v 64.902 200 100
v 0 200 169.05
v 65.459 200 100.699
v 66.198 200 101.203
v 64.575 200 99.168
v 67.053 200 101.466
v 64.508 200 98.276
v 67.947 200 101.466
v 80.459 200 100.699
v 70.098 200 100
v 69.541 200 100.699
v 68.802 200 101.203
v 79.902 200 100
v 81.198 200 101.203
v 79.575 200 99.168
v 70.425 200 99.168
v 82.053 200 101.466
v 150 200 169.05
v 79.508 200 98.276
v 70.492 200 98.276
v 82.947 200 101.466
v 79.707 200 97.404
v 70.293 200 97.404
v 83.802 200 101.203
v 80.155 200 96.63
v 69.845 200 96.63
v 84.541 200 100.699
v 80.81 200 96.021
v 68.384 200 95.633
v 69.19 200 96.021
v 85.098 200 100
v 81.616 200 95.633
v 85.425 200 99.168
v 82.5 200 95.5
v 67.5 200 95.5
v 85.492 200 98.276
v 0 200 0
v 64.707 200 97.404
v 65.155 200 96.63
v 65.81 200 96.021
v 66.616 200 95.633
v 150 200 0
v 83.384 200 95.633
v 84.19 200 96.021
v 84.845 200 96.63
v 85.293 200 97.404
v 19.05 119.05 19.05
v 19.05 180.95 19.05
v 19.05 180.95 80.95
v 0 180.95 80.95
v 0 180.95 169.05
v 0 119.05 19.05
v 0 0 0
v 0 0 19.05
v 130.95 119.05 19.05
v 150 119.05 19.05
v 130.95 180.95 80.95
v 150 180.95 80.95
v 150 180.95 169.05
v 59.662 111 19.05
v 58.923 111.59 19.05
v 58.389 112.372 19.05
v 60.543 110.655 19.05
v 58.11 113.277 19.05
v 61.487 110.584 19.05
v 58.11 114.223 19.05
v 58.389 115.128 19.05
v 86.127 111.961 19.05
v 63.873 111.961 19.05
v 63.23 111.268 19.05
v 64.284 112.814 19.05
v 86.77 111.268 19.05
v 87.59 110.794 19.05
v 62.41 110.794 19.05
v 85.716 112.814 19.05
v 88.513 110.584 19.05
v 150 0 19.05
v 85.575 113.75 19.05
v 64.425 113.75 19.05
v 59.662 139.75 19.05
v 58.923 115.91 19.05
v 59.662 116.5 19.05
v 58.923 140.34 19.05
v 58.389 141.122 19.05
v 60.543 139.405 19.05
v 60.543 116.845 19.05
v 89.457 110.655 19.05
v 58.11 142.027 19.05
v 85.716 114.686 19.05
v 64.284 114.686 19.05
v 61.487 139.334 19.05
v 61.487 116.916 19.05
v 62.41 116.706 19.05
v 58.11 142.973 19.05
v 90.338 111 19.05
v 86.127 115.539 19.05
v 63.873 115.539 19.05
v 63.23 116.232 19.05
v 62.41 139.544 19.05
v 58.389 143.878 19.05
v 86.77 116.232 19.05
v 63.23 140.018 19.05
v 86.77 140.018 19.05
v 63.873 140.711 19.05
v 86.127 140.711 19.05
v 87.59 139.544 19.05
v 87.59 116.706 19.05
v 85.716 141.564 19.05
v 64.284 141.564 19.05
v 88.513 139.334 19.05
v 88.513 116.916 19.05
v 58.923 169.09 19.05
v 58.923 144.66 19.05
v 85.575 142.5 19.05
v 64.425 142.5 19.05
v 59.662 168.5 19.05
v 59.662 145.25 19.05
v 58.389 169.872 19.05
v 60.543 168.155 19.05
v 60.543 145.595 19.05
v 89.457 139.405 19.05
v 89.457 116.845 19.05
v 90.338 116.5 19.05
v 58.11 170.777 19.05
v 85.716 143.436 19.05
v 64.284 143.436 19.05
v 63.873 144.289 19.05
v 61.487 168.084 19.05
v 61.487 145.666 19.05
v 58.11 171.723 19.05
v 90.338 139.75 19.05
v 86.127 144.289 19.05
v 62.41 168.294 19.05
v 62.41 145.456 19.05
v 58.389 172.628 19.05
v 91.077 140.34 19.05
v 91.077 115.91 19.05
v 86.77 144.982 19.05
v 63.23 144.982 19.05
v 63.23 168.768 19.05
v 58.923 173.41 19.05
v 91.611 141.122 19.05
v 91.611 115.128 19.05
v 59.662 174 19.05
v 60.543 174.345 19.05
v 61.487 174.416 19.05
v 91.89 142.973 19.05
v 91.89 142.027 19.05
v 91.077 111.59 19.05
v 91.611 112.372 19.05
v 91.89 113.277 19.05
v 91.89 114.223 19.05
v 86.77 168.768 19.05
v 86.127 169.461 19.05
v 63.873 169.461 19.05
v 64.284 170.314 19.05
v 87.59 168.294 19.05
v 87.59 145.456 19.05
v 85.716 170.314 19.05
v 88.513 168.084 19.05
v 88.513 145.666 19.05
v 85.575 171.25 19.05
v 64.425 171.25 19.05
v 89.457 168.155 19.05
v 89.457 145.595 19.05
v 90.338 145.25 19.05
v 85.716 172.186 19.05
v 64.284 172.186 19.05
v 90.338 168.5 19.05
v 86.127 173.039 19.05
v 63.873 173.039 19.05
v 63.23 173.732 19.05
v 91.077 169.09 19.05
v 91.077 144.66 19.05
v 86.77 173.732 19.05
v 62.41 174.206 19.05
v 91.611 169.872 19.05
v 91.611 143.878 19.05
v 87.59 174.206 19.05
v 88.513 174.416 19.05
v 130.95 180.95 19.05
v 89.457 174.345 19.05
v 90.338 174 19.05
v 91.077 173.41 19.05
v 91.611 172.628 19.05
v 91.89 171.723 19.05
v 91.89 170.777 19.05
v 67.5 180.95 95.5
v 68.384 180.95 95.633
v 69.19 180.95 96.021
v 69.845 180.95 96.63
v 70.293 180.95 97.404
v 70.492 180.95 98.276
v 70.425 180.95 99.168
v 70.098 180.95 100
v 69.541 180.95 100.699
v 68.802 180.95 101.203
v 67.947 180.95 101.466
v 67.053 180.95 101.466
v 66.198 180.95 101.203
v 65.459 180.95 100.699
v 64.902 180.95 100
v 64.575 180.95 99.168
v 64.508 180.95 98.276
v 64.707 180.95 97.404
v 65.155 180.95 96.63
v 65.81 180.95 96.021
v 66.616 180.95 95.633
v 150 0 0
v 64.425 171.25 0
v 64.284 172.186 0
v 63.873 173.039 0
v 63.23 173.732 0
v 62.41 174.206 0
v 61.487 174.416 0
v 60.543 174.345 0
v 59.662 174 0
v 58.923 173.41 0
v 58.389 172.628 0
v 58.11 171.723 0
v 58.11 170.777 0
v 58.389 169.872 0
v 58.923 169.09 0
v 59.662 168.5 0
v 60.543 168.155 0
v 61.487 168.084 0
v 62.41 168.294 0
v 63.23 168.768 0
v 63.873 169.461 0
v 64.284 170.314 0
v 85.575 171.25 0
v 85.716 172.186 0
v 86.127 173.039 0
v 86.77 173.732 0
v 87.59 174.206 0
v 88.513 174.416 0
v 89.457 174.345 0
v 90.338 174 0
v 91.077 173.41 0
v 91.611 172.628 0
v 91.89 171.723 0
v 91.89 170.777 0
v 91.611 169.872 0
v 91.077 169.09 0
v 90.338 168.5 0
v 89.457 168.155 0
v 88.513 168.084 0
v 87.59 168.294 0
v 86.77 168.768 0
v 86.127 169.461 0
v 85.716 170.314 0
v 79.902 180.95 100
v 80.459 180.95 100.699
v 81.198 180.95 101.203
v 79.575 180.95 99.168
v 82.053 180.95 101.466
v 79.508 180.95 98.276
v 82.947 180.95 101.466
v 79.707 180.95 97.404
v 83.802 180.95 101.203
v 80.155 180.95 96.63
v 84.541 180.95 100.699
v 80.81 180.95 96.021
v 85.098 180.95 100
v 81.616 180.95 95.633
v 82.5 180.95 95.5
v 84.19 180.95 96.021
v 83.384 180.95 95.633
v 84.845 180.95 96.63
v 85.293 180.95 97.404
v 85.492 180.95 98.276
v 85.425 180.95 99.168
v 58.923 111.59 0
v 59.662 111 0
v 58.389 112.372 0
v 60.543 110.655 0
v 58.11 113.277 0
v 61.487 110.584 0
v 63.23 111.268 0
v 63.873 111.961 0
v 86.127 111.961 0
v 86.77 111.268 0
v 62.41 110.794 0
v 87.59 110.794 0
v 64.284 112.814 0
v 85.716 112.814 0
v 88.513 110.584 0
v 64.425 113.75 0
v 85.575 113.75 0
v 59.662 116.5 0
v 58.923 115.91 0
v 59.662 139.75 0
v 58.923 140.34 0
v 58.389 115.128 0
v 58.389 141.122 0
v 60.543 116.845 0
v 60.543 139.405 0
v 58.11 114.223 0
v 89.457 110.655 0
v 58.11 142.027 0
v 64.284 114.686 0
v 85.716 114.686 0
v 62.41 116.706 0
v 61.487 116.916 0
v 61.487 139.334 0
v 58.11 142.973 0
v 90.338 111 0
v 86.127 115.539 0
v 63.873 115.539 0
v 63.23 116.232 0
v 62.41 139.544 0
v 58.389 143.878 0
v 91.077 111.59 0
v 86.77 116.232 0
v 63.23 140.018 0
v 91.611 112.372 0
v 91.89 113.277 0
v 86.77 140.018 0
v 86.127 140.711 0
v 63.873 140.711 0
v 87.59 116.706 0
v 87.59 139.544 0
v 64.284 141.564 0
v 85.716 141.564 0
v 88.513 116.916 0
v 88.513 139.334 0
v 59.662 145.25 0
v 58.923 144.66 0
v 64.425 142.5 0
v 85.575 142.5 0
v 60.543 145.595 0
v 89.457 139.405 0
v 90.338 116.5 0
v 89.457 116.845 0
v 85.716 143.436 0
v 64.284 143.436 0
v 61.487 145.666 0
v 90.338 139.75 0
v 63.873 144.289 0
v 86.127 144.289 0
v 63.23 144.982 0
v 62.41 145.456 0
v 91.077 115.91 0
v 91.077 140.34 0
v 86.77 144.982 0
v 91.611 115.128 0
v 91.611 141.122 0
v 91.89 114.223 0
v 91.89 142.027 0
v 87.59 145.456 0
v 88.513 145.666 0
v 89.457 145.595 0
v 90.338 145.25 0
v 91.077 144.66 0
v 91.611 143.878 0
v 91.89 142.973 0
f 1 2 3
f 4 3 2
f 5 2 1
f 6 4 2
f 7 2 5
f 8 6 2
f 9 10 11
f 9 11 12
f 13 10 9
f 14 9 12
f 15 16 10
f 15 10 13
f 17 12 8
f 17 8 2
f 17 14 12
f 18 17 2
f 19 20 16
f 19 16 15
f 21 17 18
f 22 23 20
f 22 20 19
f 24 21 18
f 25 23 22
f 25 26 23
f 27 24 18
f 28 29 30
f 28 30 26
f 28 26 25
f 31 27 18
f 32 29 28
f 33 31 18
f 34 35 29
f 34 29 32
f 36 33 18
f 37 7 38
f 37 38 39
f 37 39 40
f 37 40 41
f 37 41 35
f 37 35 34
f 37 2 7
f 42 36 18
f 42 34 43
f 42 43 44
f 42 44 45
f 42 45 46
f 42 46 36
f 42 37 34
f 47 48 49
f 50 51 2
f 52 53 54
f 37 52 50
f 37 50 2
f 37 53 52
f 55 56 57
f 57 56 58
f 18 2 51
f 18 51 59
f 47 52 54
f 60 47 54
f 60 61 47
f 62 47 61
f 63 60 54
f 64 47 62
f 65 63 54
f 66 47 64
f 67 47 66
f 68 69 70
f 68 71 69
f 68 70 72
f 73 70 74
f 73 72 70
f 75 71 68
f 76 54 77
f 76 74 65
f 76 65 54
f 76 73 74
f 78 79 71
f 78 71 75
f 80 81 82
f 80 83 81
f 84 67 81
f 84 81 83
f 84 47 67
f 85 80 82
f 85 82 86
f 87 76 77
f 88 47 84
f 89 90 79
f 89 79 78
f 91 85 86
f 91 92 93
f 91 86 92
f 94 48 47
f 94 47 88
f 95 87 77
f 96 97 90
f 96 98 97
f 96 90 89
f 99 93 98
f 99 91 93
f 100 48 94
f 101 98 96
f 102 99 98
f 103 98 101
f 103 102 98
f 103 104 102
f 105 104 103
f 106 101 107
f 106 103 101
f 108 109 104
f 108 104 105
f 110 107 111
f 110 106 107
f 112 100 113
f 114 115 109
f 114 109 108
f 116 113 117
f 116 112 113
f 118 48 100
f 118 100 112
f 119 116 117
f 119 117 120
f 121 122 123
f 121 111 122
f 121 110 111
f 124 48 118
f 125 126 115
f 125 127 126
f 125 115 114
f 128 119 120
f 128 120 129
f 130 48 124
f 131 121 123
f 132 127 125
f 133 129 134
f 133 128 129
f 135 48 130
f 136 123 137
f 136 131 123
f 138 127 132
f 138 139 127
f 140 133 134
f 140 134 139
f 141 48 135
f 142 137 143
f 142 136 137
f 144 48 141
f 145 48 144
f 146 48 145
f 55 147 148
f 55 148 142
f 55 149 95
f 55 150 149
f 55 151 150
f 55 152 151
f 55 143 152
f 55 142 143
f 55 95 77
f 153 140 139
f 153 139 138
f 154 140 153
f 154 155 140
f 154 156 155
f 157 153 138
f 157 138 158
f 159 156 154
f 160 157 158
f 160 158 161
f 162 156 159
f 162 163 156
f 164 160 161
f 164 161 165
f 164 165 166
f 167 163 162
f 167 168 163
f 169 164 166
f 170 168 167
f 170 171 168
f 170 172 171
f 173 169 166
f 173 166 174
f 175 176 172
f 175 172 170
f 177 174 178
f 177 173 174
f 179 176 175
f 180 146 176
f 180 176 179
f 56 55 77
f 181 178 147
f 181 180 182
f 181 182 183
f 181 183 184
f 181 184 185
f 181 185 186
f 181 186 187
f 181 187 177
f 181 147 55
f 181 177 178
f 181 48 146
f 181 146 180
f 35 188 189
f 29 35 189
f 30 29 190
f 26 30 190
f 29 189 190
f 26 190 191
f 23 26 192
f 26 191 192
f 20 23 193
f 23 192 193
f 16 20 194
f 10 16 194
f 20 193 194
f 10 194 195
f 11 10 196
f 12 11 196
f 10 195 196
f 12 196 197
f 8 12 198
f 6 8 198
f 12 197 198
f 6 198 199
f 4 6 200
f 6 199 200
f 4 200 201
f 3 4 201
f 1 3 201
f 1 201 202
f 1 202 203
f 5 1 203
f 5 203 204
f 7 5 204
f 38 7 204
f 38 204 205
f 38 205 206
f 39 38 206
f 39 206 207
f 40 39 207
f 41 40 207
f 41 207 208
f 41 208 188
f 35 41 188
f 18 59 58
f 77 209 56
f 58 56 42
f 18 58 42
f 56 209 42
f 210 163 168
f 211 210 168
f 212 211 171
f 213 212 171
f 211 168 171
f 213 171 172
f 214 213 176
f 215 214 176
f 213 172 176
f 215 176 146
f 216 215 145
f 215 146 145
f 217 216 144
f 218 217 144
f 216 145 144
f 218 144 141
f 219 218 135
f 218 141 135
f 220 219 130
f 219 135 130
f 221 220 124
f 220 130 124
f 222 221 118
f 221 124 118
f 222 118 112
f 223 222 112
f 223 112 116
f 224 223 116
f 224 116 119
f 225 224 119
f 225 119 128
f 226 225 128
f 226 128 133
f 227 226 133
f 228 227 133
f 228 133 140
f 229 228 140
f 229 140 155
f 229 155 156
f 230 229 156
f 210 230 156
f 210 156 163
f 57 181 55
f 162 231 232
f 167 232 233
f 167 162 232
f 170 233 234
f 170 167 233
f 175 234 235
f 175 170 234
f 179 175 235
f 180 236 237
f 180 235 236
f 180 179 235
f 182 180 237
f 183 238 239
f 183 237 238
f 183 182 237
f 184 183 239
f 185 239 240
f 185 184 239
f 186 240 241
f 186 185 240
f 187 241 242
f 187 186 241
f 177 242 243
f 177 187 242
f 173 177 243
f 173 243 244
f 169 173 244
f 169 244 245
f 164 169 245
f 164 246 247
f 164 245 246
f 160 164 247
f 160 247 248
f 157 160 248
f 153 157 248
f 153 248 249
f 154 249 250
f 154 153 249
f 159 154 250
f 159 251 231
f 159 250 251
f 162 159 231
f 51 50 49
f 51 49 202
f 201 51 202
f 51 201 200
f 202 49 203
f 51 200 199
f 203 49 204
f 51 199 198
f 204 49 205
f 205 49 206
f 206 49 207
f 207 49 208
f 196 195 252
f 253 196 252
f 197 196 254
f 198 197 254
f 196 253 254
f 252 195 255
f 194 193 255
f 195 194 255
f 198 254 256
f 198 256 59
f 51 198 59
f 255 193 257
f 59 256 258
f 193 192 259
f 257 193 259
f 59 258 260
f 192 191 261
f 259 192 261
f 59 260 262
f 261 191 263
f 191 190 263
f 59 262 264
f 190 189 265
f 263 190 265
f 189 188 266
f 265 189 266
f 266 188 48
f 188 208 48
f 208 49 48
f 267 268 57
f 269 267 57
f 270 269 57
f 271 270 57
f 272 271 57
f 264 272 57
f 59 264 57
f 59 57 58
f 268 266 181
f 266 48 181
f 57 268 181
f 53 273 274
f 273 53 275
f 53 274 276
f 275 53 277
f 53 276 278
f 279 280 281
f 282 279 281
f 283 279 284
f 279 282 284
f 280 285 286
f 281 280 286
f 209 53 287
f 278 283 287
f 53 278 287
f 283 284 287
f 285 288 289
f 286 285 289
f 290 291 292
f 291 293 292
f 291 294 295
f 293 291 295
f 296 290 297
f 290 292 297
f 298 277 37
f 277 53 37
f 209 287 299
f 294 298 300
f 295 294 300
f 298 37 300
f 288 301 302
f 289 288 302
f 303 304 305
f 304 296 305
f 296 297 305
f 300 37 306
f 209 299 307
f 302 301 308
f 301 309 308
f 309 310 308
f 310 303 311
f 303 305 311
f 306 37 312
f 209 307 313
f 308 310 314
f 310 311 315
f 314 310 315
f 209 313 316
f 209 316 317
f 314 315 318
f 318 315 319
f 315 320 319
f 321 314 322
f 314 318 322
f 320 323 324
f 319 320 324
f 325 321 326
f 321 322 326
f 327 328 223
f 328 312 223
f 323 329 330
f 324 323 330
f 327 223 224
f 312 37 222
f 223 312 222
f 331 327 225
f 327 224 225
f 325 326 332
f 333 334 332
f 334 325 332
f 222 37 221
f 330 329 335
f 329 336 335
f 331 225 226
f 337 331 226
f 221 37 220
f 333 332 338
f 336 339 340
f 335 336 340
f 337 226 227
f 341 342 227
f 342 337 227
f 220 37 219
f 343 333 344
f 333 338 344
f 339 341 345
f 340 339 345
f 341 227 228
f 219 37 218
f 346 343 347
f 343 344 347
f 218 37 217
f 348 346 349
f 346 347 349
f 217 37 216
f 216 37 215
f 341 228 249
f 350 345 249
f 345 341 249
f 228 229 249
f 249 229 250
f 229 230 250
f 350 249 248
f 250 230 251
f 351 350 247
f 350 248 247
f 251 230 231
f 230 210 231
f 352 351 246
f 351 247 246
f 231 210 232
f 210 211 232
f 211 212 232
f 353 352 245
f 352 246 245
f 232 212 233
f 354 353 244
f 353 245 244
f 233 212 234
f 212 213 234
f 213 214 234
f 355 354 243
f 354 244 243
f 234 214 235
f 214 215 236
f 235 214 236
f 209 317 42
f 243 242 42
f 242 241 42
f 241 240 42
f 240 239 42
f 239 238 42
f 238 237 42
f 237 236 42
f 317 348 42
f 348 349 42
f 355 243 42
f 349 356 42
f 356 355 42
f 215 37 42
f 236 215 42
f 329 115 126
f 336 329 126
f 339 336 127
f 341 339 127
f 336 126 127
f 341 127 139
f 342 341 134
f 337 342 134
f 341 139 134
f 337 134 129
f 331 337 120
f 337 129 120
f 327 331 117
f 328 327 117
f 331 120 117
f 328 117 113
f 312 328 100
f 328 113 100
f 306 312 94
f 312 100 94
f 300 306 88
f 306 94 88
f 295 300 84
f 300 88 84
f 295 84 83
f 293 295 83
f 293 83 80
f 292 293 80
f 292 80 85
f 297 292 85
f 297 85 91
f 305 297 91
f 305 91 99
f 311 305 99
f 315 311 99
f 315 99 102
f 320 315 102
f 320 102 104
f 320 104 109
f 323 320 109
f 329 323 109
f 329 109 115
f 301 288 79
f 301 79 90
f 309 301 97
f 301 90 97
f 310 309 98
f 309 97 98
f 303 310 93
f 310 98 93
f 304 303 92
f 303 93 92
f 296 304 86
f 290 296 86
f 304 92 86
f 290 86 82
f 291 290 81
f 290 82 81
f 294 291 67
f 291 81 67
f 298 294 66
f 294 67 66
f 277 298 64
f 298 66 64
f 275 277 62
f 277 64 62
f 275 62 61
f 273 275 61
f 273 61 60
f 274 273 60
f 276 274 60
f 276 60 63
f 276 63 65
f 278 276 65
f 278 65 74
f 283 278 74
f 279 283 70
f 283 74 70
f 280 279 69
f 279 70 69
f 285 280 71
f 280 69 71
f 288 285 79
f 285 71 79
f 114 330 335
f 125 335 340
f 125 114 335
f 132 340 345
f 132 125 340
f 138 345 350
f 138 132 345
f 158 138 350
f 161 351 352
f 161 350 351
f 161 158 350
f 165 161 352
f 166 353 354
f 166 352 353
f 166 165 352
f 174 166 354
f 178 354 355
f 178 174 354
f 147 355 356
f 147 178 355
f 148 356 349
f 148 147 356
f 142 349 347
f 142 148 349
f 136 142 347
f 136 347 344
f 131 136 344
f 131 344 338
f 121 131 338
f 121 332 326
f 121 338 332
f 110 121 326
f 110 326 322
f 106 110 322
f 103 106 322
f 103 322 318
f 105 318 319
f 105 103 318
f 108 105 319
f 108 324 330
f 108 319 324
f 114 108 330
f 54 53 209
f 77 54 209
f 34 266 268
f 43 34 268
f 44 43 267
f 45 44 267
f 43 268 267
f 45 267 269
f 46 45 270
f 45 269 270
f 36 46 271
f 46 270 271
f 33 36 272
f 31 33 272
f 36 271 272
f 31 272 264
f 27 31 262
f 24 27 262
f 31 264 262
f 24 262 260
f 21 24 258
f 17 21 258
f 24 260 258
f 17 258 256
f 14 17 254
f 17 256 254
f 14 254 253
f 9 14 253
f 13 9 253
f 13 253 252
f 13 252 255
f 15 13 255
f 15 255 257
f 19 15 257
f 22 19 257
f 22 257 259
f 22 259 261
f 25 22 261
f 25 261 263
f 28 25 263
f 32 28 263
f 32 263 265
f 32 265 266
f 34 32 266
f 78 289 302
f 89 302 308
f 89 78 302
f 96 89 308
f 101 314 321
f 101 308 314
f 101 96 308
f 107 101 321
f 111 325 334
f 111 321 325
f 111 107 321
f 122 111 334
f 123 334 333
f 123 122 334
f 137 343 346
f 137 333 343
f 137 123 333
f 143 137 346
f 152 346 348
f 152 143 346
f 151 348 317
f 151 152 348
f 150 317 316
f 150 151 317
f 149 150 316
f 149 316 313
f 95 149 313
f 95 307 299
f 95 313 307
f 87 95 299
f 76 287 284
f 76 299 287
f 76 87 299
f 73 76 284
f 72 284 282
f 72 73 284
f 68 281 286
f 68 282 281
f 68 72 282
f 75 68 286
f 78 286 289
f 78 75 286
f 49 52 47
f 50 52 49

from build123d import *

# Parameters (mm, degrees)
SKETCH1_W           = 150
SKETCH1_H           = 200
PLATE_DEPTH         = 19.05
SKETCH2_W           = 150
SKETCH2_H           = 19.05
BOSS_EXTRUDE1_DEPTH = 150
BOSS_EXTRUDE2_DEPTH = 19.05
SKETCH4_R           = 3.175
CUT_EXTRUDE1_DEPTH  = 292.547594742
SKETCH6_R           = 3
CUT_EXTRUDE2_DEPTH  = 290.518229132


with BuildPart() as part:
    # Sketch1 → Plate (new body)
    with BuildSketch(Plane.XY):
        with Locations((75, 100)):
            Rectangle(SKETCH1_W, SKETCH1_H)
    extrude(amount=PLATE_DEPTH)

    # Sketch2 → Boss-Extrude1 (add)
    with BuildSketch(Plane.XY.offset(19.05)):
        with Locations((75, 190.475)):
            Rectangle(SKETCH2_W, SKETCH2_H)
    extrude(amount=BOSS_EXTRUDE1_DEPTH)

    # Sketch3 → Boss-Extrude2 (add)
    with BuildSketch(Plane.ZY):
        Polygon((0, 200), (0, 100), (100, 200), align=None)
    boss_extrude2 = extrude(amount=-BOSS_EXTRUDE2_DEPTH)

    # Mirror1: Boss-Extrude2 across plane
    add(boss_extrude2.mirror(Plane.ZY.offset(-75)))

    # Sketch4 → Cut-Extrude1 (cut, symmetric)
    with BuildSketch(Plane.XY.offset(19.05)):
        with Locations((61.25, 171.25)):
            Circle(SKETCH4_R)
        with Locations((61.25, 142.5)):
            Circle(SKETCH4_R)
        with Locations((61.25, 113.75)):
            Circle(SKETCH4_R)
    cut_extrude1 = extrude(amount=CUT_EXTRUDE1_DEPTH, both=True, mode=Mode.SUBTRACT)

    # Mirror2: Cut-Extrude1 across plane
    add(cut_extrude1.mirror(Plane.ZY.offset(-75)), mode=Mode.SUBTRACT)

    # Sketch6 → Cut-Extrude2 (cut, through all)
    with BuildSketch(Plane.XZ.offset(-180.95)):
        with Locations(Location((67.5, 98.5, 0), (0, 0, 270))):
            Circle(SKETCH6_R)
        with Locations(Location((82.5, 98.5, 0), (0, 0, 270))):
            Circle(SKETCH6_R)
    extrude(amount=-CUT_EXTRUDE2_DEPTH, mode=Mode.SUBTRACT)


solid = part.part
